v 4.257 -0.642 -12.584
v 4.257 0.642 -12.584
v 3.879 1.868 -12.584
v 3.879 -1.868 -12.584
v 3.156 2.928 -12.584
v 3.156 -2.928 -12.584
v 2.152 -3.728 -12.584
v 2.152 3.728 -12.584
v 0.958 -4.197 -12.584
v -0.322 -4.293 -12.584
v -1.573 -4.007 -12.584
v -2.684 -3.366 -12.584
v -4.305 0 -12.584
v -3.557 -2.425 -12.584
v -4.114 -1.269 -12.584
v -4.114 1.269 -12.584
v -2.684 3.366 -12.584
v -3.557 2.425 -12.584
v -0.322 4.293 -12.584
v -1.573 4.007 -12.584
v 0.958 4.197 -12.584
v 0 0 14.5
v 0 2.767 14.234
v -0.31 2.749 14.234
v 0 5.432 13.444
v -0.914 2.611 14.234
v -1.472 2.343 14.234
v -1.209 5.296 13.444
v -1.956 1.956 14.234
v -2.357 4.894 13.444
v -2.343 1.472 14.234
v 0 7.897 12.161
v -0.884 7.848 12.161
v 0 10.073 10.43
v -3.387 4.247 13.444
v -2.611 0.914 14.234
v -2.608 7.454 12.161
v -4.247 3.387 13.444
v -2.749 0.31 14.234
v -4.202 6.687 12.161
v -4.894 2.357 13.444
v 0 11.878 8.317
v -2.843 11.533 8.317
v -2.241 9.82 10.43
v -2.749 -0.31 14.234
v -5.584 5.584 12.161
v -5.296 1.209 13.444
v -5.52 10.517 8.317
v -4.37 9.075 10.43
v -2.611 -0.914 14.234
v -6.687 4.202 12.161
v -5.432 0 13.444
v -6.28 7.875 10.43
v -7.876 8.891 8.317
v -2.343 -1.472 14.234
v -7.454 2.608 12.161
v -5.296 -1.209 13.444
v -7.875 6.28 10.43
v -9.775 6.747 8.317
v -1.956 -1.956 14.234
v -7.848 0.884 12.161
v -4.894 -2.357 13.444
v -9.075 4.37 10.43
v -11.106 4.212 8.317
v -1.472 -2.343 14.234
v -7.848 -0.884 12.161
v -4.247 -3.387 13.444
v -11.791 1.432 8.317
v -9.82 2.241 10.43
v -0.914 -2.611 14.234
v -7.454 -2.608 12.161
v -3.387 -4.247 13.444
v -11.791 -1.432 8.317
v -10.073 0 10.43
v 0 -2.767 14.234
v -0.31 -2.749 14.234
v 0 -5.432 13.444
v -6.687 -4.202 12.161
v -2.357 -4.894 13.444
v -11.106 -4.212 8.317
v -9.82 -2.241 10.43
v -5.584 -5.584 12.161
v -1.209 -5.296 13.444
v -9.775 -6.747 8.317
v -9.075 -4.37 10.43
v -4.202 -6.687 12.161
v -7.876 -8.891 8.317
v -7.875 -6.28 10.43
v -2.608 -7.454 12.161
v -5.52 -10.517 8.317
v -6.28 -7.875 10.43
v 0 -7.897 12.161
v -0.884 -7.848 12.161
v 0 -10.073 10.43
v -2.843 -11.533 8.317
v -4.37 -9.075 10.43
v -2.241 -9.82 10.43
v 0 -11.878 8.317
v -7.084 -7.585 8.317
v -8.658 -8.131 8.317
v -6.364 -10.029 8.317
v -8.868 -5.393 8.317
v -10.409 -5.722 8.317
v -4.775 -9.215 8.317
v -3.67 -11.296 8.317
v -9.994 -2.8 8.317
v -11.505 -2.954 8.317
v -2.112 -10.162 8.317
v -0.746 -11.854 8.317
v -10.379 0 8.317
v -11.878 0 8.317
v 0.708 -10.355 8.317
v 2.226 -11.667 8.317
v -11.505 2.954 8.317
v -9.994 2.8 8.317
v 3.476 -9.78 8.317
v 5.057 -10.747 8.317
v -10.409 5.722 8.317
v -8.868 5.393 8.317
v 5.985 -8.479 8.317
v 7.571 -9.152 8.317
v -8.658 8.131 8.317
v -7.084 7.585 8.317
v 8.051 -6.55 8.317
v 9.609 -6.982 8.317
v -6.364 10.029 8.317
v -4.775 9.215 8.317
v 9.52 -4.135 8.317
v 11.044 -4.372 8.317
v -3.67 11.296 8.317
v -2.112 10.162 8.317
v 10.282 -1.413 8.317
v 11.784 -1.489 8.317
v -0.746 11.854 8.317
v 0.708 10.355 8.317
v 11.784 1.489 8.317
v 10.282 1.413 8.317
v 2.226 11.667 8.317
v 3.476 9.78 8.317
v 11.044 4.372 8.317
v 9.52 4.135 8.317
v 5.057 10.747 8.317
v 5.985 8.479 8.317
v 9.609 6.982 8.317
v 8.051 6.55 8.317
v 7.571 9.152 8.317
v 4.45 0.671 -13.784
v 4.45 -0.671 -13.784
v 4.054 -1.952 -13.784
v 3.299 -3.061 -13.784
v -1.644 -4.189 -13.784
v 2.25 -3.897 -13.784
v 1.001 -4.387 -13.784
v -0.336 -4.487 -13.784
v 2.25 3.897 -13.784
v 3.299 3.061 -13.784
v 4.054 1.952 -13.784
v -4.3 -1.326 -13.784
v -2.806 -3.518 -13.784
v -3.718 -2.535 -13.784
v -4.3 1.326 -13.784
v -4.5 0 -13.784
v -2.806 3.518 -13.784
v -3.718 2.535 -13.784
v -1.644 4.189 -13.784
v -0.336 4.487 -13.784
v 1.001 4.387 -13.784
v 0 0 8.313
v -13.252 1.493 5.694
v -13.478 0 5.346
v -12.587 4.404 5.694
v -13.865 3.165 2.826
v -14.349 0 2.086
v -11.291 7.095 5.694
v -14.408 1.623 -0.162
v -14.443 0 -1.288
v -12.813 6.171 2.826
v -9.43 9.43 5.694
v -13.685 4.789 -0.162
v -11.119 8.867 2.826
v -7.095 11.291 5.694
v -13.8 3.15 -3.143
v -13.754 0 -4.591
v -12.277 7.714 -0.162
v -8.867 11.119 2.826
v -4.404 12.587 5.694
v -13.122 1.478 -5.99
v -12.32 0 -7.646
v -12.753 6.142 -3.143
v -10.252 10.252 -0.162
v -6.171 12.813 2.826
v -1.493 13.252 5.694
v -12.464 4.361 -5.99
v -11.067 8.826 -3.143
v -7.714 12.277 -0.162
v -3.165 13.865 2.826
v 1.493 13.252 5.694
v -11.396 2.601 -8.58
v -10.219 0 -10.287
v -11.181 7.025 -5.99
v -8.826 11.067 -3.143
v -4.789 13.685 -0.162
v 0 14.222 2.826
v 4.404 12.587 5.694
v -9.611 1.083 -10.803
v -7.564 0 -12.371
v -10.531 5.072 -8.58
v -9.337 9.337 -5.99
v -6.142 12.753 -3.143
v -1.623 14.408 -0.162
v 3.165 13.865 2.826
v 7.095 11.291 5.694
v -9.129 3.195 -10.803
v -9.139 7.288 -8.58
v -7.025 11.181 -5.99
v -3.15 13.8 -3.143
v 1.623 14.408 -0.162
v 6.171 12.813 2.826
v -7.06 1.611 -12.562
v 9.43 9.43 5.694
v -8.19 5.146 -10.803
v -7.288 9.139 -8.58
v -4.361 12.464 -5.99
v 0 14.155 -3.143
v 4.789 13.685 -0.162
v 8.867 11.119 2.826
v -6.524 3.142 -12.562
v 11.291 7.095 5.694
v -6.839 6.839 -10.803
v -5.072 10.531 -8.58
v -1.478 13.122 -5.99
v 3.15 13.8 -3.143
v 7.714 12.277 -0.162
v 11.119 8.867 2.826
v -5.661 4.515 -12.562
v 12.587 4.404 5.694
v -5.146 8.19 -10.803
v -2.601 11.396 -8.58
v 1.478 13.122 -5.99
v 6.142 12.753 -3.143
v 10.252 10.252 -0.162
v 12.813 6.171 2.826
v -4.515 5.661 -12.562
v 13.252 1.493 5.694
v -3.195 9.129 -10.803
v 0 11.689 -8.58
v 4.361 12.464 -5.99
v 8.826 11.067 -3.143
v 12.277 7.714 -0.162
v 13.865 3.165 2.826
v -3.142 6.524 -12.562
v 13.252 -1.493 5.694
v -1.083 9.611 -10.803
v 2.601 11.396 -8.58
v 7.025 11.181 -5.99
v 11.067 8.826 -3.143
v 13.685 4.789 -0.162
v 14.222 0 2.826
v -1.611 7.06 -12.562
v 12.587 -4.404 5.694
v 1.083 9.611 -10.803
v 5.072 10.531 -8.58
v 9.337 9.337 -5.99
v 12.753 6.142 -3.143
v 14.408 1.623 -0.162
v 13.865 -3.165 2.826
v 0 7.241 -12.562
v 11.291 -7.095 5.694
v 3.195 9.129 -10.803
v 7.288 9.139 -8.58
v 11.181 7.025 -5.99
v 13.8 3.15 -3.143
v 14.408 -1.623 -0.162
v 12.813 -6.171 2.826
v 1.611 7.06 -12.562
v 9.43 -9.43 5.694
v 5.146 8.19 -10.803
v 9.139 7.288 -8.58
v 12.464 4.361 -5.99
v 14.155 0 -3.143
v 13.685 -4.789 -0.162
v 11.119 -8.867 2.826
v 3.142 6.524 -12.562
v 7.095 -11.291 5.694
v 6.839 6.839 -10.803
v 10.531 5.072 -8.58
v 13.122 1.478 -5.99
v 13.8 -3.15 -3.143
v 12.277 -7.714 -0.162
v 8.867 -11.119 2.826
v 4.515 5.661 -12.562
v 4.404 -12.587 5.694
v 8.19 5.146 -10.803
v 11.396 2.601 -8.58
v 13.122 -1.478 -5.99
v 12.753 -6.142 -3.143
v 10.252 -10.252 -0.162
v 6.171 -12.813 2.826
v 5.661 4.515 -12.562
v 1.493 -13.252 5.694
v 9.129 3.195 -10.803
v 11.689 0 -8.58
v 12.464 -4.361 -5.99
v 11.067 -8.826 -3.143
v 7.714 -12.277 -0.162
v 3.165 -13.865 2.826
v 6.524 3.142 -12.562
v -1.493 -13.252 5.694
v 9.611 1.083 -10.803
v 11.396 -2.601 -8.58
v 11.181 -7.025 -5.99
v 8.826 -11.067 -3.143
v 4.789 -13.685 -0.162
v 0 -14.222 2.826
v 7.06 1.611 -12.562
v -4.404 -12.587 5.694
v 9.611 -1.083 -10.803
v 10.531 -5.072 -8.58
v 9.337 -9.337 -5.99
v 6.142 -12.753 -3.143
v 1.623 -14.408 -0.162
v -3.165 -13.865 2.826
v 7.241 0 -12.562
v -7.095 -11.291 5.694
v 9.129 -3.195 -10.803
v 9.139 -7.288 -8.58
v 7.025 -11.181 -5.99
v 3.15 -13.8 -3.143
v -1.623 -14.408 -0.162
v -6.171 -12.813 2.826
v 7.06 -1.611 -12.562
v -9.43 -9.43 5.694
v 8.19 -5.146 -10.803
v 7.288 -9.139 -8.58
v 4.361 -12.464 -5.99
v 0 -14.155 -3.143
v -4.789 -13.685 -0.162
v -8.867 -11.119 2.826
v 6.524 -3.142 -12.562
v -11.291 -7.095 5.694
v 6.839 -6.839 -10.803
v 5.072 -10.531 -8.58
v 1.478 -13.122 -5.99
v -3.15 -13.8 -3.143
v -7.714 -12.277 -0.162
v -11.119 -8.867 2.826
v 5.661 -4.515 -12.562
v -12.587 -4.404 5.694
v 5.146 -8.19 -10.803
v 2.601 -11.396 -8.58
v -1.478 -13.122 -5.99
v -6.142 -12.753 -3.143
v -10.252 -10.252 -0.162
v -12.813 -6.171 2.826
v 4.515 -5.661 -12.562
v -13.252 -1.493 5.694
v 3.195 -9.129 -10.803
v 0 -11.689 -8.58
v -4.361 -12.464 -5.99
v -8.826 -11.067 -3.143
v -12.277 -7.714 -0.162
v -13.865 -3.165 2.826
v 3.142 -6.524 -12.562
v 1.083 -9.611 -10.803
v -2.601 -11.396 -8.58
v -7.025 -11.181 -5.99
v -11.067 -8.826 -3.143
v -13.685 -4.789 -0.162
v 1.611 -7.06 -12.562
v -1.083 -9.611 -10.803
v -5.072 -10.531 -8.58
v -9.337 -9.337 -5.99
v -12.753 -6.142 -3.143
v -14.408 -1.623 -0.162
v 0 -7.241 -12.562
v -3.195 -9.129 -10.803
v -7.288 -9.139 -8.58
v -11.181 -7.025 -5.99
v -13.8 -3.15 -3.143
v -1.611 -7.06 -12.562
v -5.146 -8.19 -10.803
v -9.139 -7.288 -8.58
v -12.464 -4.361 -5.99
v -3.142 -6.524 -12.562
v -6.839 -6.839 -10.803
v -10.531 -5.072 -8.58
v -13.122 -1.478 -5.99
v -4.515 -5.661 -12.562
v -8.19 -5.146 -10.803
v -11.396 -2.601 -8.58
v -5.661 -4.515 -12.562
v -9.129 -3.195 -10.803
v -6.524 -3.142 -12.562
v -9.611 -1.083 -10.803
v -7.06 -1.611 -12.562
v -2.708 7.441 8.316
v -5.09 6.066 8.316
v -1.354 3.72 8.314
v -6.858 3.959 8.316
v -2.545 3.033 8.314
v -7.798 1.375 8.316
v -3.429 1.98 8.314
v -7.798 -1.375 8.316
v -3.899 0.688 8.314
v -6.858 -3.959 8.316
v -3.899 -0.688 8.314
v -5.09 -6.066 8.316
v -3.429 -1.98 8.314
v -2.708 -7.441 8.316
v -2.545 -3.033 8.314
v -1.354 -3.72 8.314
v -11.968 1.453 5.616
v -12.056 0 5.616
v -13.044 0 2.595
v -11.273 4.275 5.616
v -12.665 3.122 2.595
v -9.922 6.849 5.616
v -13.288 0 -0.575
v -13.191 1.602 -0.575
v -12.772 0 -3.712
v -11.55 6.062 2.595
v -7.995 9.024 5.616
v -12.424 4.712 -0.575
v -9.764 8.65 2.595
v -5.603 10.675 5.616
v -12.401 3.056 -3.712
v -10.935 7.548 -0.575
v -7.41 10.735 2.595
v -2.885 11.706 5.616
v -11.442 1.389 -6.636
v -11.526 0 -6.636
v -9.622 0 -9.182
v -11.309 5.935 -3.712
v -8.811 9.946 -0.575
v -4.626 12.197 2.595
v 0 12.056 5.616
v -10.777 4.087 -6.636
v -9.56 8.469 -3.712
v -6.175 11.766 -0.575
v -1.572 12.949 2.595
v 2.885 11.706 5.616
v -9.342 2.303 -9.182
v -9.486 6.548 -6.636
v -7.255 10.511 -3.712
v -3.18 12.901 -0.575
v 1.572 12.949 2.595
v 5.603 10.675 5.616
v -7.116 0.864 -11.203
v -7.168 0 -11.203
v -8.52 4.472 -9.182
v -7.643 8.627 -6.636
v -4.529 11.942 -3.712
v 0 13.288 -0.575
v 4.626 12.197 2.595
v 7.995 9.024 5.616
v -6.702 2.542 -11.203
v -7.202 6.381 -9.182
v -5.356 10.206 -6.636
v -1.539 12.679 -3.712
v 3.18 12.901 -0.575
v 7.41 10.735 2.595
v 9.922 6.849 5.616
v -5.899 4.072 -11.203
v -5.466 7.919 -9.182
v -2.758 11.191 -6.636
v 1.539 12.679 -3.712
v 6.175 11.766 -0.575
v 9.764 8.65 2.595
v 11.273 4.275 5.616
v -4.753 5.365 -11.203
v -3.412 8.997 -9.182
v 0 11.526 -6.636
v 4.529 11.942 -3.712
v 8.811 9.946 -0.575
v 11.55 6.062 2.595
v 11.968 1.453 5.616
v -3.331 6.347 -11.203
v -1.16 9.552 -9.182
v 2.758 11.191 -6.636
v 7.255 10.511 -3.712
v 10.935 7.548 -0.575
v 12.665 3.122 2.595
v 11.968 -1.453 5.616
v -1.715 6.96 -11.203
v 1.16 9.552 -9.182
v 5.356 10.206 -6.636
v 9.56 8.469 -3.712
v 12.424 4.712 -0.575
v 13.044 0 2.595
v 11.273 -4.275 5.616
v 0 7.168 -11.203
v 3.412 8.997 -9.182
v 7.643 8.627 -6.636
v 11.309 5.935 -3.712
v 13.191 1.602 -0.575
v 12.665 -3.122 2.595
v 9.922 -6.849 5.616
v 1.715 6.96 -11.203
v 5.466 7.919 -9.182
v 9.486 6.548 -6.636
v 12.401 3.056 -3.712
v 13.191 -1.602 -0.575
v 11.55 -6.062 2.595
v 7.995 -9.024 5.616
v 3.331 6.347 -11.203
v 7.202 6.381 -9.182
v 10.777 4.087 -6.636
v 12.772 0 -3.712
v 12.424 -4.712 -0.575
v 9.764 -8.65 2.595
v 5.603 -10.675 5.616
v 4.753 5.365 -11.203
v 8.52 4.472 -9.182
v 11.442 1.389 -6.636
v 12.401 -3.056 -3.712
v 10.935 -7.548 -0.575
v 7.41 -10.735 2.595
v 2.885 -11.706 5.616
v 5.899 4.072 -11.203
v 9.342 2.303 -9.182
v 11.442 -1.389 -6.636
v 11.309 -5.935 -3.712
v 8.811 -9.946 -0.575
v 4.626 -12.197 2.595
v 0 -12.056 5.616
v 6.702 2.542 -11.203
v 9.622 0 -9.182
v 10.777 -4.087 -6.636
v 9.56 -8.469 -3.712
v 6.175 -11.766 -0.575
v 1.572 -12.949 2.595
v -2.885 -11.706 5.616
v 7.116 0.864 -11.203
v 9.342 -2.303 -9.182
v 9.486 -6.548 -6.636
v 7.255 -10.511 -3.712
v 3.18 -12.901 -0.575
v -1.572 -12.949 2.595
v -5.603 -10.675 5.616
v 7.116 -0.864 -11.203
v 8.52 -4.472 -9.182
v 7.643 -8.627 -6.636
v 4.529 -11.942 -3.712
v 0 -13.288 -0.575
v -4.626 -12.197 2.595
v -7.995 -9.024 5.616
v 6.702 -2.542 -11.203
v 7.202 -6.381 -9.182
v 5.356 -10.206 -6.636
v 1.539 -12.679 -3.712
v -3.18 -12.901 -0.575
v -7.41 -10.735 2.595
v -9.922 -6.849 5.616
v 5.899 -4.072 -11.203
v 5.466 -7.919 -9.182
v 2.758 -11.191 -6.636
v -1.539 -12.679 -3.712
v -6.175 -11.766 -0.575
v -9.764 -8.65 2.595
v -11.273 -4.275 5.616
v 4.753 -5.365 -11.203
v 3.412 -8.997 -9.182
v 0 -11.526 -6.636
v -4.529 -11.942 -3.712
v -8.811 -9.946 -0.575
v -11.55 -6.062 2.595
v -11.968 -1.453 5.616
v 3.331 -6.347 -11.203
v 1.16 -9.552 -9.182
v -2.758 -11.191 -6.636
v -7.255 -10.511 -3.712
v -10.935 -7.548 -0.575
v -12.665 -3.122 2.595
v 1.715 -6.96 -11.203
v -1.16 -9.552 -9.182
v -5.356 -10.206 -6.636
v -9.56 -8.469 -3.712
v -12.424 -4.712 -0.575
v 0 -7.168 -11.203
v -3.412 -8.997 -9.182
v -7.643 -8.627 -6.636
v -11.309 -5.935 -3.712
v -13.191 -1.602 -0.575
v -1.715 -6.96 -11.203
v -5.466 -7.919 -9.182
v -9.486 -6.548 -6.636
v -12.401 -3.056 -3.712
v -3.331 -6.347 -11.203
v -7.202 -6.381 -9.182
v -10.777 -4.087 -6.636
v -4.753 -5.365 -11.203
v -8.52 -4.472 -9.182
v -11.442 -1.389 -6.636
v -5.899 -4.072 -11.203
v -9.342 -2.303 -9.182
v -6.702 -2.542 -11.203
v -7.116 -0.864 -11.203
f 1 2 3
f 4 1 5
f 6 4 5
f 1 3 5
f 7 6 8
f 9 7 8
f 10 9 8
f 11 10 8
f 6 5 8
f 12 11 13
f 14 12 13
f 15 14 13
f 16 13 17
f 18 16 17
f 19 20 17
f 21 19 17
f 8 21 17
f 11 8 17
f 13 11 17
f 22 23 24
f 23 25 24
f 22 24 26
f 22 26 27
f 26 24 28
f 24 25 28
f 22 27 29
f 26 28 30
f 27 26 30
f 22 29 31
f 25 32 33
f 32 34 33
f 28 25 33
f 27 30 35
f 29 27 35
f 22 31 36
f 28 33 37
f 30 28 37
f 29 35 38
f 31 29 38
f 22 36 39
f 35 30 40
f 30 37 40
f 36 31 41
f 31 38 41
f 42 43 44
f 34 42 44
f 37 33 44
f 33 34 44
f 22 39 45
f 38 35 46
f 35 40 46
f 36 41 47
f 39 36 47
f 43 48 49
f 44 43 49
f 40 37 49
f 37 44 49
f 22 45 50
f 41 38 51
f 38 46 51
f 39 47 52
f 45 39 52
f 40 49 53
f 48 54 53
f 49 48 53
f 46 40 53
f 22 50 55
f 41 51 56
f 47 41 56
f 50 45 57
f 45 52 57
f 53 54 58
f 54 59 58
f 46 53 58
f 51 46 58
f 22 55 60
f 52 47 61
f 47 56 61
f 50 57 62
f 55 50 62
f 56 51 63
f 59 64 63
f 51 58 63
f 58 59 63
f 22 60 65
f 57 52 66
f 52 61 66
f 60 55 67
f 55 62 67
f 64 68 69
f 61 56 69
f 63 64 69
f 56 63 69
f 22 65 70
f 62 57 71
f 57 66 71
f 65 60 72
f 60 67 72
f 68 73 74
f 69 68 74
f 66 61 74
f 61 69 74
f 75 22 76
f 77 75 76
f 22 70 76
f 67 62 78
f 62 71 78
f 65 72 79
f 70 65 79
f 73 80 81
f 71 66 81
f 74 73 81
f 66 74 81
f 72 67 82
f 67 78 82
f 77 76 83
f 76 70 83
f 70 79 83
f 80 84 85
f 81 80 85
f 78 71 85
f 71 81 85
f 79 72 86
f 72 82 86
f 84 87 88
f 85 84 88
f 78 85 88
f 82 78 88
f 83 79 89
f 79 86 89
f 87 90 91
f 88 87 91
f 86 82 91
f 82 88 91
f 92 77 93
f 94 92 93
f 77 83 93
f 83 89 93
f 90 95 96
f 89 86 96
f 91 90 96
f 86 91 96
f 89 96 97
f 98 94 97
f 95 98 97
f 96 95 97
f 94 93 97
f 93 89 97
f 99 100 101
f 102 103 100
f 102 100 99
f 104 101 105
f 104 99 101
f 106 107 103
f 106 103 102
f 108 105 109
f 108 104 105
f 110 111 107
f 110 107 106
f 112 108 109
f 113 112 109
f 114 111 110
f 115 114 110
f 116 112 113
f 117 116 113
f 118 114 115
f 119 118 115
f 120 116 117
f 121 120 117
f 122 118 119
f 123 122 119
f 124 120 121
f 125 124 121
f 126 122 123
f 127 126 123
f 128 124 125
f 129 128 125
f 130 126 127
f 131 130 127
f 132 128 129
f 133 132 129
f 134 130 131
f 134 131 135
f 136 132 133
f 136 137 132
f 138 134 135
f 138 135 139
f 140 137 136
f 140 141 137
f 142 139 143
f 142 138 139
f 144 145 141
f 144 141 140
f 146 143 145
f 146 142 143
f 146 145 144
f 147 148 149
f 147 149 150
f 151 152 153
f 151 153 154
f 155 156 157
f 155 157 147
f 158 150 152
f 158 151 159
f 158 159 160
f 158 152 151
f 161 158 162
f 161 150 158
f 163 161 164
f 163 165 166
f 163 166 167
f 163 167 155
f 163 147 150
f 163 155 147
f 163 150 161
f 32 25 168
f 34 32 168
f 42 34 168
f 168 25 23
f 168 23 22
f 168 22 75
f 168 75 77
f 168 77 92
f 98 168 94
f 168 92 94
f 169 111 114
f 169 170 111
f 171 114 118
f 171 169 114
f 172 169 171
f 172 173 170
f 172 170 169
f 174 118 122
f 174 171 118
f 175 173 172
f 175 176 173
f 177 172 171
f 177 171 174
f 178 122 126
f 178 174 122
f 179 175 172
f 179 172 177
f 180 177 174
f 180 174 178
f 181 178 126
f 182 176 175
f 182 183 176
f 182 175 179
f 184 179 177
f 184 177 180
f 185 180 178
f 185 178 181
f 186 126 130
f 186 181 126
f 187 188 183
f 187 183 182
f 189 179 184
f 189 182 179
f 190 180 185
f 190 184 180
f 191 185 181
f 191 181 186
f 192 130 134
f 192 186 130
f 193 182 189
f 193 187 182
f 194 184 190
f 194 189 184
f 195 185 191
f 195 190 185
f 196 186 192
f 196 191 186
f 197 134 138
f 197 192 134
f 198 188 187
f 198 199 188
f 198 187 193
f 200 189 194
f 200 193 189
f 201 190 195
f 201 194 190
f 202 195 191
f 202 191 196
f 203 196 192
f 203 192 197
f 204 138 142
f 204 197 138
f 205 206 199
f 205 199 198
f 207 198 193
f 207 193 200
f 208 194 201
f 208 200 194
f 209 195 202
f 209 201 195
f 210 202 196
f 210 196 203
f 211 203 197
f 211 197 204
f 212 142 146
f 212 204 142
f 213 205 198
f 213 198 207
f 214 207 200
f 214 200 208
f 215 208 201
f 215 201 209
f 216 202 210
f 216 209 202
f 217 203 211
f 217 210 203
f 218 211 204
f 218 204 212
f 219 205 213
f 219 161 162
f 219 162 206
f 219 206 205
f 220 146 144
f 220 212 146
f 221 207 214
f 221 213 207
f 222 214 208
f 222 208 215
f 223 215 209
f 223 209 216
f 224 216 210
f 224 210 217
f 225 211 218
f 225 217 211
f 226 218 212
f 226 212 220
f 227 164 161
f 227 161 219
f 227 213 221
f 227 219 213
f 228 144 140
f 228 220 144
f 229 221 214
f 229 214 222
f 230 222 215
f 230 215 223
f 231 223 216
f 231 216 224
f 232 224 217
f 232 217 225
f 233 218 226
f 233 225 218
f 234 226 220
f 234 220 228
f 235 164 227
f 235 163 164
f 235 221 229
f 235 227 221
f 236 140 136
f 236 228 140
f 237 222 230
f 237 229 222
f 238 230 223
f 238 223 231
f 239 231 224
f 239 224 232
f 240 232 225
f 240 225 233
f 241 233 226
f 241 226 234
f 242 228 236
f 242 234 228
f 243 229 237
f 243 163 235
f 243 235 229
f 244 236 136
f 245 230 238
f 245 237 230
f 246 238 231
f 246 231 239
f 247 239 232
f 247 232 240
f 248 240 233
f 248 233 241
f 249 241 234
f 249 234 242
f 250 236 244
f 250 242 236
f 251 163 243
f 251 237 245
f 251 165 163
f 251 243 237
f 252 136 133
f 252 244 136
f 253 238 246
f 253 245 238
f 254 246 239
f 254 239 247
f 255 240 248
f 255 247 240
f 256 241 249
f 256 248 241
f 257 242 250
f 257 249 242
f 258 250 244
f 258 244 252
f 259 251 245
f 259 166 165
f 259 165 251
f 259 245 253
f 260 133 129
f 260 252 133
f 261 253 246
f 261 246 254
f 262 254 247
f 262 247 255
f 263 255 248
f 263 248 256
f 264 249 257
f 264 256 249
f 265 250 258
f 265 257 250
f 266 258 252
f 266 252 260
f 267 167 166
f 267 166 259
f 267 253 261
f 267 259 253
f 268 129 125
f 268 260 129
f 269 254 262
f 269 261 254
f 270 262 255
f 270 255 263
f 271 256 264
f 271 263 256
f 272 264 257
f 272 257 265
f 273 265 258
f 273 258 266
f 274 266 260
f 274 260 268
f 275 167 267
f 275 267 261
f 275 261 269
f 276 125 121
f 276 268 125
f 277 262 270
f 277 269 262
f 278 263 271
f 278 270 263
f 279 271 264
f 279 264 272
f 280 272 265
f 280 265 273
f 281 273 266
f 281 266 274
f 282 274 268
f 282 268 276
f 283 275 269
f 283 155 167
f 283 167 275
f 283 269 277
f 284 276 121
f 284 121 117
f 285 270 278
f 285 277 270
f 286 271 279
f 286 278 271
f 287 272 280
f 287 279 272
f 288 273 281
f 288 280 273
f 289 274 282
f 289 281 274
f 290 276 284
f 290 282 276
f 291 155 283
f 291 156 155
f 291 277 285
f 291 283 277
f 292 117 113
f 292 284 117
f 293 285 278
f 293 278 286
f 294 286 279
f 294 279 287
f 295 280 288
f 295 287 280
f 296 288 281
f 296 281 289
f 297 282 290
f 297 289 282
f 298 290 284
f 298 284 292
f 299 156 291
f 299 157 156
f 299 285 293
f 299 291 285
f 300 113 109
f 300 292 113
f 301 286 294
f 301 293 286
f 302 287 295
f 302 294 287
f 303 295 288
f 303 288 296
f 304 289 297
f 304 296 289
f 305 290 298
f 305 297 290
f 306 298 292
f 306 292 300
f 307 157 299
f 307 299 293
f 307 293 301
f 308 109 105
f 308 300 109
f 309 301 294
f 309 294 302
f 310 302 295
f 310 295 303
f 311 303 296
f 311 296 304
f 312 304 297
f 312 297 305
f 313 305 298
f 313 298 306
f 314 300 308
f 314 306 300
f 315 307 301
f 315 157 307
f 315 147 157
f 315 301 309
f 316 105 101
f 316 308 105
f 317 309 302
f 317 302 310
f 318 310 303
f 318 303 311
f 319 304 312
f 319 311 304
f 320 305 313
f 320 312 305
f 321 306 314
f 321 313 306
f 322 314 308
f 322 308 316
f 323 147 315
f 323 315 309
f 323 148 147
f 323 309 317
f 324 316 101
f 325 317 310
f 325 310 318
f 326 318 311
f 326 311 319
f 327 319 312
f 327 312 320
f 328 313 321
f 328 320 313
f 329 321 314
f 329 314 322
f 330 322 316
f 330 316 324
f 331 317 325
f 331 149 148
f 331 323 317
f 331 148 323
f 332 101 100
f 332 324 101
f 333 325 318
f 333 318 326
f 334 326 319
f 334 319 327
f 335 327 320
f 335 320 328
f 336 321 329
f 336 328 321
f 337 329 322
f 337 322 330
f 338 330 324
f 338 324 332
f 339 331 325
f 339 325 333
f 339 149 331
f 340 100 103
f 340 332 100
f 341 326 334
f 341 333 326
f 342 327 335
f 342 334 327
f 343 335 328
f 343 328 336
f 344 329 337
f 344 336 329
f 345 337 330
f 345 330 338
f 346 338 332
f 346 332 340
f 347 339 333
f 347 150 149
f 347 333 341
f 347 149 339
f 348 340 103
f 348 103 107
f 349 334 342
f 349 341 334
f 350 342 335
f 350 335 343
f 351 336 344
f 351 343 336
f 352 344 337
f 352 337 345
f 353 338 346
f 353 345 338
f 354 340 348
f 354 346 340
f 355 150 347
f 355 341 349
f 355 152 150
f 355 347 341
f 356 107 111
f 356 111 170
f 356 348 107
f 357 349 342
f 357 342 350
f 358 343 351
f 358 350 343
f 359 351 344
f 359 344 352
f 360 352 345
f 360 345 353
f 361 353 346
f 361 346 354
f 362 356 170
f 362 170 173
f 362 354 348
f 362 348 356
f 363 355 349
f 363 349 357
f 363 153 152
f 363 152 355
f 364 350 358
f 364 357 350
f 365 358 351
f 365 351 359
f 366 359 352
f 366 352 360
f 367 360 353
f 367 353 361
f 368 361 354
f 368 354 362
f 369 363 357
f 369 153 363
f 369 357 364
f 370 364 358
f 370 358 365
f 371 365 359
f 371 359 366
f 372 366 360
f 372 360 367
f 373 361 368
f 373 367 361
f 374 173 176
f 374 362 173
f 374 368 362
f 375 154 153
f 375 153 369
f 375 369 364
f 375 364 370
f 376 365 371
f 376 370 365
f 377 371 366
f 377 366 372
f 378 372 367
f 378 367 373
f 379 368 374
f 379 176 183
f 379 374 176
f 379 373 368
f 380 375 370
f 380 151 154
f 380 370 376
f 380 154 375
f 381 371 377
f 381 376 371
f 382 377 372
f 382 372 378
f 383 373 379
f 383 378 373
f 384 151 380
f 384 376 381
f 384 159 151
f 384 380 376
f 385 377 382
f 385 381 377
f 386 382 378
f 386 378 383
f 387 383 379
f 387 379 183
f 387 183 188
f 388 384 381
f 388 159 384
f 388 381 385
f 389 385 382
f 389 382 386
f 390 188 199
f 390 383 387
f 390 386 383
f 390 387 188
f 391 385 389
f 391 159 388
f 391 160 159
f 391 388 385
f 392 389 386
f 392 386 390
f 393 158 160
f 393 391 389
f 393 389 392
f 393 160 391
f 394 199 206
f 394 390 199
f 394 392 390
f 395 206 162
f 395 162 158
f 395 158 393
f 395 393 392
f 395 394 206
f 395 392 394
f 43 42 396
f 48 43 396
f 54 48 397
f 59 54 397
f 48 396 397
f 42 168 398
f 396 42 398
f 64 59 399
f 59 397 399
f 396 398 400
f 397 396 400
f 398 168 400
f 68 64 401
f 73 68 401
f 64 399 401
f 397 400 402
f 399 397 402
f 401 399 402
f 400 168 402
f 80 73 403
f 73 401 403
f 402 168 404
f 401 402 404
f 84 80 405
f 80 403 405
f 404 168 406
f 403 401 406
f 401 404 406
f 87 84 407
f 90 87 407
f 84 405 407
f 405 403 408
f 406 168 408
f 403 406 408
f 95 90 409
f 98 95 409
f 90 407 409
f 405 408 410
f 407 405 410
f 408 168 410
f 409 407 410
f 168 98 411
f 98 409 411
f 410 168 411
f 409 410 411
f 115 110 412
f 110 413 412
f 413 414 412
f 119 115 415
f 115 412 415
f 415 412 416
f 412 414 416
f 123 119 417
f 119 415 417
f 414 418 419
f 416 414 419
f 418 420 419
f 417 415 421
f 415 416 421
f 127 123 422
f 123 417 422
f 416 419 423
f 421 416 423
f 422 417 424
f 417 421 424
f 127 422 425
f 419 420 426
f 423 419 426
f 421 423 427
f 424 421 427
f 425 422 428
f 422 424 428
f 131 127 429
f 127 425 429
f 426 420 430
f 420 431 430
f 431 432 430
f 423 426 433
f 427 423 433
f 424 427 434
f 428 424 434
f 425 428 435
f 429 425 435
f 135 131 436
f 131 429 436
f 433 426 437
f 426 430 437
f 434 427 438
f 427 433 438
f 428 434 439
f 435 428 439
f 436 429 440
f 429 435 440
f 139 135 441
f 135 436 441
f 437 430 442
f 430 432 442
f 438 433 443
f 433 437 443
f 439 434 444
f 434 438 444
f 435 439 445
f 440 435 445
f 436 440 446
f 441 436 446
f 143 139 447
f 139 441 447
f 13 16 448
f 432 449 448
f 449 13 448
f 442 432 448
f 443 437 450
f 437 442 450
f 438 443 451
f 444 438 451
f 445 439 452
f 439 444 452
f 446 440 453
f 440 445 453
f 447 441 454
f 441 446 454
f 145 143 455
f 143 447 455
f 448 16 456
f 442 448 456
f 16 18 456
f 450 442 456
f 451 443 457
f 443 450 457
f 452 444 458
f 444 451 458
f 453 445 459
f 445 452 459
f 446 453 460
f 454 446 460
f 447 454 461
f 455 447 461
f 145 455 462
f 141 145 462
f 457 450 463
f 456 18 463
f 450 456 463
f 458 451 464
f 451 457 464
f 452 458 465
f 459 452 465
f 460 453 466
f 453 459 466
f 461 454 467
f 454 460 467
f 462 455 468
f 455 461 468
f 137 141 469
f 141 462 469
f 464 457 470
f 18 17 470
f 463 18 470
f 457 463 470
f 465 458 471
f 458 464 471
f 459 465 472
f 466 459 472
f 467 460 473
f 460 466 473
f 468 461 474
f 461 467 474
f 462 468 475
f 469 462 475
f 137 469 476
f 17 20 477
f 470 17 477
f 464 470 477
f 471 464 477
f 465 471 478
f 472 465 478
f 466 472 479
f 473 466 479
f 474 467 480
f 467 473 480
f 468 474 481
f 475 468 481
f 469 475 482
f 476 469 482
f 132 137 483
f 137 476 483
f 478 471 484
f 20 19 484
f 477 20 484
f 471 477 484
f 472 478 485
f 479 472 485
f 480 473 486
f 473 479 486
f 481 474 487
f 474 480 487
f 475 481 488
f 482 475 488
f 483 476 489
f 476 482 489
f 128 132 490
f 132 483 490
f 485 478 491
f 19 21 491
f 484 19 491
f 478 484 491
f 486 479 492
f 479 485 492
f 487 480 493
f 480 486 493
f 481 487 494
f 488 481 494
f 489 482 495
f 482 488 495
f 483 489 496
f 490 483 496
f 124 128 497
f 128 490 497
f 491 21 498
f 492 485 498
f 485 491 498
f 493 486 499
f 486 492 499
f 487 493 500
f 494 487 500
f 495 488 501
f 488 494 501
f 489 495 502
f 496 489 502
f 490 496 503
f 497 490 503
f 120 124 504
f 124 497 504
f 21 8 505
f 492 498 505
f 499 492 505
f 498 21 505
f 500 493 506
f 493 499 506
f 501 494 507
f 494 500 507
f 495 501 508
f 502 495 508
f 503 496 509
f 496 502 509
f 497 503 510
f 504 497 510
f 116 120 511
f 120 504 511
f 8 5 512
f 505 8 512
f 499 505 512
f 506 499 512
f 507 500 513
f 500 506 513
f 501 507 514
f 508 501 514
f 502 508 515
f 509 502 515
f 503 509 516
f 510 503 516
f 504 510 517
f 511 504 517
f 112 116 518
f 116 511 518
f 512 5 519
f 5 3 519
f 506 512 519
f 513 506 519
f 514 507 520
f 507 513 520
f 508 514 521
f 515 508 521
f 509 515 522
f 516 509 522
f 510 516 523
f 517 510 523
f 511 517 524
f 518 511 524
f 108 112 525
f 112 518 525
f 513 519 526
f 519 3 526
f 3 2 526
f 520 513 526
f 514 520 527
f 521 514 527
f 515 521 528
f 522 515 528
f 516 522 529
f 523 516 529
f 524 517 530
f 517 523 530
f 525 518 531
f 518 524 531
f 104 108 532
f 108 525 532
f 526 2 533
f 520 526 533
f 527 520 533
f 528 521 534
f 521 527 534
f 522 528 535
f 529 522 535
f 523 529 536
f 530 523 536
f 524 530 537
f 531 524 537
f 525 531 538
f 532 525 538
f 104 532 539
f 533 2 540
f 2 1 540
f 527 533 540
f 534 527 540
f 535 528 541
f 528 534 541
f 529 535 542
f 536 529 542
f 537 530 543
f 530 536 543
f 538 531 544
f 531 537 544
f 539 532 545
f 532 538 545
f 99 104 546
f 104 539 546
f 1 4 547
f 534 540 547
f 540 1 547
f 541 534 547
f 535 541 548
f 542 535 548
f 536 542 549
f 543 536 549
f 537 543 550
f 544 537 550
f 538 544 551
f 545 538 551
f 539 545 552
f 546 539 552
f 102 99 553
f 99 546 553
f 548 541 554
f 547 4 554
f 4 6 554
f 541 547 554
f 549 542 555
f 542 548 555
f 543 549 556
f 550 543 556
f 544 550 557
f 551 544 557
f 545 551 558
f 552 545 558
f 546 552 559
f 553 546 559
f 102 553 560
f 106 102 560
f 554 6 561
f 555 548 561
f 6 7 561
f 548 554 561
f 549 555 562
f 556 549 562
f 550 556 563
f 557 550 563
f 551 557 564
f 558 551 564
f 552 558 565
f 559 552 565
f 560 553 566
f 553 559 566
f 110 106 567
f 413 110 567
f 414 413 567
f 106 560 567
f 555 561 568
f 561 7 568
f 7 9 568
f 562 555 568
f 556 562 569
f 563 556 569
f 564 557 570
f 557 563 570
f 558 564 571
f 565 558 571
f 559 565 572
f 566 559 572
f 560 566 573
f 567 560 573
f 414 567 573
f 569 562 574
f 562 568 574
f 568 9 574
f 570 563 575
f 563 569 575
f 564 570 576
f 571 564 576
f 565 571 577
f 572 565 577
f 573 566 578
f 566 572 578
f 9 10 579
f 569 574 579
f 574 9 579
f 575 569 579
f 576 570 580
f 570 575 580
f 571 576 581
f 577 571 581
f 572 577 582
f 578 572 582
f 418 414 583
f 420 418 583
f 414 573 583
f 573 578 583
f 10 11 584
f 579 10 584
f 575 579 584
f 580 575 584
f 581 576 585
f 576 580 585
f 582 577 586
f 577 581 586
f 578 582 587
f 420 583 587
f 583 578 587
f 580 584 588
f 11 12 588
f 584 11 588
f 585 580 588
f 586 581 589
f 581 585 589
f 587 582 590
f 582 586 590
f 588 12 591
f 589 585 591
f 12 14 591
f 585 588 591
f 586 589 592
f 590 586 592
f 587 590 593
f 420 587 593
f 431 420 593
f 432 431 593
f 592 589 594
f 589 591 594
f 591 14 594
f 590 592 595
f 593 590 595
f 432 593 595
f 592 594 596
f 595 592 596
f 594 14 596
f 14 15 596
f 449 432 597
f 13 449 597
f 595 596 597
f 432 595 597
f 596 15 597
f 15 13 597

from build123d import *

# Parameters (mm, degrees)
F2_T          = -1.2
F4_ANGLE_BACK = 90
F4_ANGLE      = 180


with BuildPart() as f1:
    # F0 (on Front) → F1 (revolve)
    with BuildSketch(Plane.XZ):
        with BuildLine():
            Line((0, -13.7840487521), (0, 8.3168583271))
            Line((0, 8.3168583271), (-11.8777046422, 8.3168583271))
            ThreePointArc((-11.8777046422, 8.3168583271), (-13.7539022015, -4.5913150875), (-4.5, -13.7840487521))
            Line((-4.5, -13.7840487521), (0, -13.7840487521))
        make_face()
    revolve(axis=Axis((0, 0, 0.357975624), (0, 0, -1)))

    # F2
    f2_openings = [f1.faces().sort_by_distance(p)[0] for p in [
        (0, 0, 8.316858),
    ]]
    offset(amount=F2_T, openings=f2_openings)


with BuildPart() as f4:
    # F3 (on Front) → F4 (revolve)
    with BuildSketch(Plane.XZ, mode=Mode.PRIVATE) as f4_sk:
        with BuildLine():
            Line((0, 8.3129135892), (0, 14.5))
            ThreePointArc((0, 14.5), (-6.6953548919, 12.8616570811), (-11.8777046422, 8.3168583271))
            Line((-11.8777046422, 8.3168583271), (0, 8.3129135892))
        make_face()
    revolve(f4_sk.sketch.rotate(Axis((0, 0, 11.4064567946), (0, 0, 1)), -F4_ANGLE_BACK), axis=Axis((0, 0, 11.4064567946), (0, 0, 1)), revolution_arc=F4_ANGLE)


solid = Compound([f1.part, f4.part])
